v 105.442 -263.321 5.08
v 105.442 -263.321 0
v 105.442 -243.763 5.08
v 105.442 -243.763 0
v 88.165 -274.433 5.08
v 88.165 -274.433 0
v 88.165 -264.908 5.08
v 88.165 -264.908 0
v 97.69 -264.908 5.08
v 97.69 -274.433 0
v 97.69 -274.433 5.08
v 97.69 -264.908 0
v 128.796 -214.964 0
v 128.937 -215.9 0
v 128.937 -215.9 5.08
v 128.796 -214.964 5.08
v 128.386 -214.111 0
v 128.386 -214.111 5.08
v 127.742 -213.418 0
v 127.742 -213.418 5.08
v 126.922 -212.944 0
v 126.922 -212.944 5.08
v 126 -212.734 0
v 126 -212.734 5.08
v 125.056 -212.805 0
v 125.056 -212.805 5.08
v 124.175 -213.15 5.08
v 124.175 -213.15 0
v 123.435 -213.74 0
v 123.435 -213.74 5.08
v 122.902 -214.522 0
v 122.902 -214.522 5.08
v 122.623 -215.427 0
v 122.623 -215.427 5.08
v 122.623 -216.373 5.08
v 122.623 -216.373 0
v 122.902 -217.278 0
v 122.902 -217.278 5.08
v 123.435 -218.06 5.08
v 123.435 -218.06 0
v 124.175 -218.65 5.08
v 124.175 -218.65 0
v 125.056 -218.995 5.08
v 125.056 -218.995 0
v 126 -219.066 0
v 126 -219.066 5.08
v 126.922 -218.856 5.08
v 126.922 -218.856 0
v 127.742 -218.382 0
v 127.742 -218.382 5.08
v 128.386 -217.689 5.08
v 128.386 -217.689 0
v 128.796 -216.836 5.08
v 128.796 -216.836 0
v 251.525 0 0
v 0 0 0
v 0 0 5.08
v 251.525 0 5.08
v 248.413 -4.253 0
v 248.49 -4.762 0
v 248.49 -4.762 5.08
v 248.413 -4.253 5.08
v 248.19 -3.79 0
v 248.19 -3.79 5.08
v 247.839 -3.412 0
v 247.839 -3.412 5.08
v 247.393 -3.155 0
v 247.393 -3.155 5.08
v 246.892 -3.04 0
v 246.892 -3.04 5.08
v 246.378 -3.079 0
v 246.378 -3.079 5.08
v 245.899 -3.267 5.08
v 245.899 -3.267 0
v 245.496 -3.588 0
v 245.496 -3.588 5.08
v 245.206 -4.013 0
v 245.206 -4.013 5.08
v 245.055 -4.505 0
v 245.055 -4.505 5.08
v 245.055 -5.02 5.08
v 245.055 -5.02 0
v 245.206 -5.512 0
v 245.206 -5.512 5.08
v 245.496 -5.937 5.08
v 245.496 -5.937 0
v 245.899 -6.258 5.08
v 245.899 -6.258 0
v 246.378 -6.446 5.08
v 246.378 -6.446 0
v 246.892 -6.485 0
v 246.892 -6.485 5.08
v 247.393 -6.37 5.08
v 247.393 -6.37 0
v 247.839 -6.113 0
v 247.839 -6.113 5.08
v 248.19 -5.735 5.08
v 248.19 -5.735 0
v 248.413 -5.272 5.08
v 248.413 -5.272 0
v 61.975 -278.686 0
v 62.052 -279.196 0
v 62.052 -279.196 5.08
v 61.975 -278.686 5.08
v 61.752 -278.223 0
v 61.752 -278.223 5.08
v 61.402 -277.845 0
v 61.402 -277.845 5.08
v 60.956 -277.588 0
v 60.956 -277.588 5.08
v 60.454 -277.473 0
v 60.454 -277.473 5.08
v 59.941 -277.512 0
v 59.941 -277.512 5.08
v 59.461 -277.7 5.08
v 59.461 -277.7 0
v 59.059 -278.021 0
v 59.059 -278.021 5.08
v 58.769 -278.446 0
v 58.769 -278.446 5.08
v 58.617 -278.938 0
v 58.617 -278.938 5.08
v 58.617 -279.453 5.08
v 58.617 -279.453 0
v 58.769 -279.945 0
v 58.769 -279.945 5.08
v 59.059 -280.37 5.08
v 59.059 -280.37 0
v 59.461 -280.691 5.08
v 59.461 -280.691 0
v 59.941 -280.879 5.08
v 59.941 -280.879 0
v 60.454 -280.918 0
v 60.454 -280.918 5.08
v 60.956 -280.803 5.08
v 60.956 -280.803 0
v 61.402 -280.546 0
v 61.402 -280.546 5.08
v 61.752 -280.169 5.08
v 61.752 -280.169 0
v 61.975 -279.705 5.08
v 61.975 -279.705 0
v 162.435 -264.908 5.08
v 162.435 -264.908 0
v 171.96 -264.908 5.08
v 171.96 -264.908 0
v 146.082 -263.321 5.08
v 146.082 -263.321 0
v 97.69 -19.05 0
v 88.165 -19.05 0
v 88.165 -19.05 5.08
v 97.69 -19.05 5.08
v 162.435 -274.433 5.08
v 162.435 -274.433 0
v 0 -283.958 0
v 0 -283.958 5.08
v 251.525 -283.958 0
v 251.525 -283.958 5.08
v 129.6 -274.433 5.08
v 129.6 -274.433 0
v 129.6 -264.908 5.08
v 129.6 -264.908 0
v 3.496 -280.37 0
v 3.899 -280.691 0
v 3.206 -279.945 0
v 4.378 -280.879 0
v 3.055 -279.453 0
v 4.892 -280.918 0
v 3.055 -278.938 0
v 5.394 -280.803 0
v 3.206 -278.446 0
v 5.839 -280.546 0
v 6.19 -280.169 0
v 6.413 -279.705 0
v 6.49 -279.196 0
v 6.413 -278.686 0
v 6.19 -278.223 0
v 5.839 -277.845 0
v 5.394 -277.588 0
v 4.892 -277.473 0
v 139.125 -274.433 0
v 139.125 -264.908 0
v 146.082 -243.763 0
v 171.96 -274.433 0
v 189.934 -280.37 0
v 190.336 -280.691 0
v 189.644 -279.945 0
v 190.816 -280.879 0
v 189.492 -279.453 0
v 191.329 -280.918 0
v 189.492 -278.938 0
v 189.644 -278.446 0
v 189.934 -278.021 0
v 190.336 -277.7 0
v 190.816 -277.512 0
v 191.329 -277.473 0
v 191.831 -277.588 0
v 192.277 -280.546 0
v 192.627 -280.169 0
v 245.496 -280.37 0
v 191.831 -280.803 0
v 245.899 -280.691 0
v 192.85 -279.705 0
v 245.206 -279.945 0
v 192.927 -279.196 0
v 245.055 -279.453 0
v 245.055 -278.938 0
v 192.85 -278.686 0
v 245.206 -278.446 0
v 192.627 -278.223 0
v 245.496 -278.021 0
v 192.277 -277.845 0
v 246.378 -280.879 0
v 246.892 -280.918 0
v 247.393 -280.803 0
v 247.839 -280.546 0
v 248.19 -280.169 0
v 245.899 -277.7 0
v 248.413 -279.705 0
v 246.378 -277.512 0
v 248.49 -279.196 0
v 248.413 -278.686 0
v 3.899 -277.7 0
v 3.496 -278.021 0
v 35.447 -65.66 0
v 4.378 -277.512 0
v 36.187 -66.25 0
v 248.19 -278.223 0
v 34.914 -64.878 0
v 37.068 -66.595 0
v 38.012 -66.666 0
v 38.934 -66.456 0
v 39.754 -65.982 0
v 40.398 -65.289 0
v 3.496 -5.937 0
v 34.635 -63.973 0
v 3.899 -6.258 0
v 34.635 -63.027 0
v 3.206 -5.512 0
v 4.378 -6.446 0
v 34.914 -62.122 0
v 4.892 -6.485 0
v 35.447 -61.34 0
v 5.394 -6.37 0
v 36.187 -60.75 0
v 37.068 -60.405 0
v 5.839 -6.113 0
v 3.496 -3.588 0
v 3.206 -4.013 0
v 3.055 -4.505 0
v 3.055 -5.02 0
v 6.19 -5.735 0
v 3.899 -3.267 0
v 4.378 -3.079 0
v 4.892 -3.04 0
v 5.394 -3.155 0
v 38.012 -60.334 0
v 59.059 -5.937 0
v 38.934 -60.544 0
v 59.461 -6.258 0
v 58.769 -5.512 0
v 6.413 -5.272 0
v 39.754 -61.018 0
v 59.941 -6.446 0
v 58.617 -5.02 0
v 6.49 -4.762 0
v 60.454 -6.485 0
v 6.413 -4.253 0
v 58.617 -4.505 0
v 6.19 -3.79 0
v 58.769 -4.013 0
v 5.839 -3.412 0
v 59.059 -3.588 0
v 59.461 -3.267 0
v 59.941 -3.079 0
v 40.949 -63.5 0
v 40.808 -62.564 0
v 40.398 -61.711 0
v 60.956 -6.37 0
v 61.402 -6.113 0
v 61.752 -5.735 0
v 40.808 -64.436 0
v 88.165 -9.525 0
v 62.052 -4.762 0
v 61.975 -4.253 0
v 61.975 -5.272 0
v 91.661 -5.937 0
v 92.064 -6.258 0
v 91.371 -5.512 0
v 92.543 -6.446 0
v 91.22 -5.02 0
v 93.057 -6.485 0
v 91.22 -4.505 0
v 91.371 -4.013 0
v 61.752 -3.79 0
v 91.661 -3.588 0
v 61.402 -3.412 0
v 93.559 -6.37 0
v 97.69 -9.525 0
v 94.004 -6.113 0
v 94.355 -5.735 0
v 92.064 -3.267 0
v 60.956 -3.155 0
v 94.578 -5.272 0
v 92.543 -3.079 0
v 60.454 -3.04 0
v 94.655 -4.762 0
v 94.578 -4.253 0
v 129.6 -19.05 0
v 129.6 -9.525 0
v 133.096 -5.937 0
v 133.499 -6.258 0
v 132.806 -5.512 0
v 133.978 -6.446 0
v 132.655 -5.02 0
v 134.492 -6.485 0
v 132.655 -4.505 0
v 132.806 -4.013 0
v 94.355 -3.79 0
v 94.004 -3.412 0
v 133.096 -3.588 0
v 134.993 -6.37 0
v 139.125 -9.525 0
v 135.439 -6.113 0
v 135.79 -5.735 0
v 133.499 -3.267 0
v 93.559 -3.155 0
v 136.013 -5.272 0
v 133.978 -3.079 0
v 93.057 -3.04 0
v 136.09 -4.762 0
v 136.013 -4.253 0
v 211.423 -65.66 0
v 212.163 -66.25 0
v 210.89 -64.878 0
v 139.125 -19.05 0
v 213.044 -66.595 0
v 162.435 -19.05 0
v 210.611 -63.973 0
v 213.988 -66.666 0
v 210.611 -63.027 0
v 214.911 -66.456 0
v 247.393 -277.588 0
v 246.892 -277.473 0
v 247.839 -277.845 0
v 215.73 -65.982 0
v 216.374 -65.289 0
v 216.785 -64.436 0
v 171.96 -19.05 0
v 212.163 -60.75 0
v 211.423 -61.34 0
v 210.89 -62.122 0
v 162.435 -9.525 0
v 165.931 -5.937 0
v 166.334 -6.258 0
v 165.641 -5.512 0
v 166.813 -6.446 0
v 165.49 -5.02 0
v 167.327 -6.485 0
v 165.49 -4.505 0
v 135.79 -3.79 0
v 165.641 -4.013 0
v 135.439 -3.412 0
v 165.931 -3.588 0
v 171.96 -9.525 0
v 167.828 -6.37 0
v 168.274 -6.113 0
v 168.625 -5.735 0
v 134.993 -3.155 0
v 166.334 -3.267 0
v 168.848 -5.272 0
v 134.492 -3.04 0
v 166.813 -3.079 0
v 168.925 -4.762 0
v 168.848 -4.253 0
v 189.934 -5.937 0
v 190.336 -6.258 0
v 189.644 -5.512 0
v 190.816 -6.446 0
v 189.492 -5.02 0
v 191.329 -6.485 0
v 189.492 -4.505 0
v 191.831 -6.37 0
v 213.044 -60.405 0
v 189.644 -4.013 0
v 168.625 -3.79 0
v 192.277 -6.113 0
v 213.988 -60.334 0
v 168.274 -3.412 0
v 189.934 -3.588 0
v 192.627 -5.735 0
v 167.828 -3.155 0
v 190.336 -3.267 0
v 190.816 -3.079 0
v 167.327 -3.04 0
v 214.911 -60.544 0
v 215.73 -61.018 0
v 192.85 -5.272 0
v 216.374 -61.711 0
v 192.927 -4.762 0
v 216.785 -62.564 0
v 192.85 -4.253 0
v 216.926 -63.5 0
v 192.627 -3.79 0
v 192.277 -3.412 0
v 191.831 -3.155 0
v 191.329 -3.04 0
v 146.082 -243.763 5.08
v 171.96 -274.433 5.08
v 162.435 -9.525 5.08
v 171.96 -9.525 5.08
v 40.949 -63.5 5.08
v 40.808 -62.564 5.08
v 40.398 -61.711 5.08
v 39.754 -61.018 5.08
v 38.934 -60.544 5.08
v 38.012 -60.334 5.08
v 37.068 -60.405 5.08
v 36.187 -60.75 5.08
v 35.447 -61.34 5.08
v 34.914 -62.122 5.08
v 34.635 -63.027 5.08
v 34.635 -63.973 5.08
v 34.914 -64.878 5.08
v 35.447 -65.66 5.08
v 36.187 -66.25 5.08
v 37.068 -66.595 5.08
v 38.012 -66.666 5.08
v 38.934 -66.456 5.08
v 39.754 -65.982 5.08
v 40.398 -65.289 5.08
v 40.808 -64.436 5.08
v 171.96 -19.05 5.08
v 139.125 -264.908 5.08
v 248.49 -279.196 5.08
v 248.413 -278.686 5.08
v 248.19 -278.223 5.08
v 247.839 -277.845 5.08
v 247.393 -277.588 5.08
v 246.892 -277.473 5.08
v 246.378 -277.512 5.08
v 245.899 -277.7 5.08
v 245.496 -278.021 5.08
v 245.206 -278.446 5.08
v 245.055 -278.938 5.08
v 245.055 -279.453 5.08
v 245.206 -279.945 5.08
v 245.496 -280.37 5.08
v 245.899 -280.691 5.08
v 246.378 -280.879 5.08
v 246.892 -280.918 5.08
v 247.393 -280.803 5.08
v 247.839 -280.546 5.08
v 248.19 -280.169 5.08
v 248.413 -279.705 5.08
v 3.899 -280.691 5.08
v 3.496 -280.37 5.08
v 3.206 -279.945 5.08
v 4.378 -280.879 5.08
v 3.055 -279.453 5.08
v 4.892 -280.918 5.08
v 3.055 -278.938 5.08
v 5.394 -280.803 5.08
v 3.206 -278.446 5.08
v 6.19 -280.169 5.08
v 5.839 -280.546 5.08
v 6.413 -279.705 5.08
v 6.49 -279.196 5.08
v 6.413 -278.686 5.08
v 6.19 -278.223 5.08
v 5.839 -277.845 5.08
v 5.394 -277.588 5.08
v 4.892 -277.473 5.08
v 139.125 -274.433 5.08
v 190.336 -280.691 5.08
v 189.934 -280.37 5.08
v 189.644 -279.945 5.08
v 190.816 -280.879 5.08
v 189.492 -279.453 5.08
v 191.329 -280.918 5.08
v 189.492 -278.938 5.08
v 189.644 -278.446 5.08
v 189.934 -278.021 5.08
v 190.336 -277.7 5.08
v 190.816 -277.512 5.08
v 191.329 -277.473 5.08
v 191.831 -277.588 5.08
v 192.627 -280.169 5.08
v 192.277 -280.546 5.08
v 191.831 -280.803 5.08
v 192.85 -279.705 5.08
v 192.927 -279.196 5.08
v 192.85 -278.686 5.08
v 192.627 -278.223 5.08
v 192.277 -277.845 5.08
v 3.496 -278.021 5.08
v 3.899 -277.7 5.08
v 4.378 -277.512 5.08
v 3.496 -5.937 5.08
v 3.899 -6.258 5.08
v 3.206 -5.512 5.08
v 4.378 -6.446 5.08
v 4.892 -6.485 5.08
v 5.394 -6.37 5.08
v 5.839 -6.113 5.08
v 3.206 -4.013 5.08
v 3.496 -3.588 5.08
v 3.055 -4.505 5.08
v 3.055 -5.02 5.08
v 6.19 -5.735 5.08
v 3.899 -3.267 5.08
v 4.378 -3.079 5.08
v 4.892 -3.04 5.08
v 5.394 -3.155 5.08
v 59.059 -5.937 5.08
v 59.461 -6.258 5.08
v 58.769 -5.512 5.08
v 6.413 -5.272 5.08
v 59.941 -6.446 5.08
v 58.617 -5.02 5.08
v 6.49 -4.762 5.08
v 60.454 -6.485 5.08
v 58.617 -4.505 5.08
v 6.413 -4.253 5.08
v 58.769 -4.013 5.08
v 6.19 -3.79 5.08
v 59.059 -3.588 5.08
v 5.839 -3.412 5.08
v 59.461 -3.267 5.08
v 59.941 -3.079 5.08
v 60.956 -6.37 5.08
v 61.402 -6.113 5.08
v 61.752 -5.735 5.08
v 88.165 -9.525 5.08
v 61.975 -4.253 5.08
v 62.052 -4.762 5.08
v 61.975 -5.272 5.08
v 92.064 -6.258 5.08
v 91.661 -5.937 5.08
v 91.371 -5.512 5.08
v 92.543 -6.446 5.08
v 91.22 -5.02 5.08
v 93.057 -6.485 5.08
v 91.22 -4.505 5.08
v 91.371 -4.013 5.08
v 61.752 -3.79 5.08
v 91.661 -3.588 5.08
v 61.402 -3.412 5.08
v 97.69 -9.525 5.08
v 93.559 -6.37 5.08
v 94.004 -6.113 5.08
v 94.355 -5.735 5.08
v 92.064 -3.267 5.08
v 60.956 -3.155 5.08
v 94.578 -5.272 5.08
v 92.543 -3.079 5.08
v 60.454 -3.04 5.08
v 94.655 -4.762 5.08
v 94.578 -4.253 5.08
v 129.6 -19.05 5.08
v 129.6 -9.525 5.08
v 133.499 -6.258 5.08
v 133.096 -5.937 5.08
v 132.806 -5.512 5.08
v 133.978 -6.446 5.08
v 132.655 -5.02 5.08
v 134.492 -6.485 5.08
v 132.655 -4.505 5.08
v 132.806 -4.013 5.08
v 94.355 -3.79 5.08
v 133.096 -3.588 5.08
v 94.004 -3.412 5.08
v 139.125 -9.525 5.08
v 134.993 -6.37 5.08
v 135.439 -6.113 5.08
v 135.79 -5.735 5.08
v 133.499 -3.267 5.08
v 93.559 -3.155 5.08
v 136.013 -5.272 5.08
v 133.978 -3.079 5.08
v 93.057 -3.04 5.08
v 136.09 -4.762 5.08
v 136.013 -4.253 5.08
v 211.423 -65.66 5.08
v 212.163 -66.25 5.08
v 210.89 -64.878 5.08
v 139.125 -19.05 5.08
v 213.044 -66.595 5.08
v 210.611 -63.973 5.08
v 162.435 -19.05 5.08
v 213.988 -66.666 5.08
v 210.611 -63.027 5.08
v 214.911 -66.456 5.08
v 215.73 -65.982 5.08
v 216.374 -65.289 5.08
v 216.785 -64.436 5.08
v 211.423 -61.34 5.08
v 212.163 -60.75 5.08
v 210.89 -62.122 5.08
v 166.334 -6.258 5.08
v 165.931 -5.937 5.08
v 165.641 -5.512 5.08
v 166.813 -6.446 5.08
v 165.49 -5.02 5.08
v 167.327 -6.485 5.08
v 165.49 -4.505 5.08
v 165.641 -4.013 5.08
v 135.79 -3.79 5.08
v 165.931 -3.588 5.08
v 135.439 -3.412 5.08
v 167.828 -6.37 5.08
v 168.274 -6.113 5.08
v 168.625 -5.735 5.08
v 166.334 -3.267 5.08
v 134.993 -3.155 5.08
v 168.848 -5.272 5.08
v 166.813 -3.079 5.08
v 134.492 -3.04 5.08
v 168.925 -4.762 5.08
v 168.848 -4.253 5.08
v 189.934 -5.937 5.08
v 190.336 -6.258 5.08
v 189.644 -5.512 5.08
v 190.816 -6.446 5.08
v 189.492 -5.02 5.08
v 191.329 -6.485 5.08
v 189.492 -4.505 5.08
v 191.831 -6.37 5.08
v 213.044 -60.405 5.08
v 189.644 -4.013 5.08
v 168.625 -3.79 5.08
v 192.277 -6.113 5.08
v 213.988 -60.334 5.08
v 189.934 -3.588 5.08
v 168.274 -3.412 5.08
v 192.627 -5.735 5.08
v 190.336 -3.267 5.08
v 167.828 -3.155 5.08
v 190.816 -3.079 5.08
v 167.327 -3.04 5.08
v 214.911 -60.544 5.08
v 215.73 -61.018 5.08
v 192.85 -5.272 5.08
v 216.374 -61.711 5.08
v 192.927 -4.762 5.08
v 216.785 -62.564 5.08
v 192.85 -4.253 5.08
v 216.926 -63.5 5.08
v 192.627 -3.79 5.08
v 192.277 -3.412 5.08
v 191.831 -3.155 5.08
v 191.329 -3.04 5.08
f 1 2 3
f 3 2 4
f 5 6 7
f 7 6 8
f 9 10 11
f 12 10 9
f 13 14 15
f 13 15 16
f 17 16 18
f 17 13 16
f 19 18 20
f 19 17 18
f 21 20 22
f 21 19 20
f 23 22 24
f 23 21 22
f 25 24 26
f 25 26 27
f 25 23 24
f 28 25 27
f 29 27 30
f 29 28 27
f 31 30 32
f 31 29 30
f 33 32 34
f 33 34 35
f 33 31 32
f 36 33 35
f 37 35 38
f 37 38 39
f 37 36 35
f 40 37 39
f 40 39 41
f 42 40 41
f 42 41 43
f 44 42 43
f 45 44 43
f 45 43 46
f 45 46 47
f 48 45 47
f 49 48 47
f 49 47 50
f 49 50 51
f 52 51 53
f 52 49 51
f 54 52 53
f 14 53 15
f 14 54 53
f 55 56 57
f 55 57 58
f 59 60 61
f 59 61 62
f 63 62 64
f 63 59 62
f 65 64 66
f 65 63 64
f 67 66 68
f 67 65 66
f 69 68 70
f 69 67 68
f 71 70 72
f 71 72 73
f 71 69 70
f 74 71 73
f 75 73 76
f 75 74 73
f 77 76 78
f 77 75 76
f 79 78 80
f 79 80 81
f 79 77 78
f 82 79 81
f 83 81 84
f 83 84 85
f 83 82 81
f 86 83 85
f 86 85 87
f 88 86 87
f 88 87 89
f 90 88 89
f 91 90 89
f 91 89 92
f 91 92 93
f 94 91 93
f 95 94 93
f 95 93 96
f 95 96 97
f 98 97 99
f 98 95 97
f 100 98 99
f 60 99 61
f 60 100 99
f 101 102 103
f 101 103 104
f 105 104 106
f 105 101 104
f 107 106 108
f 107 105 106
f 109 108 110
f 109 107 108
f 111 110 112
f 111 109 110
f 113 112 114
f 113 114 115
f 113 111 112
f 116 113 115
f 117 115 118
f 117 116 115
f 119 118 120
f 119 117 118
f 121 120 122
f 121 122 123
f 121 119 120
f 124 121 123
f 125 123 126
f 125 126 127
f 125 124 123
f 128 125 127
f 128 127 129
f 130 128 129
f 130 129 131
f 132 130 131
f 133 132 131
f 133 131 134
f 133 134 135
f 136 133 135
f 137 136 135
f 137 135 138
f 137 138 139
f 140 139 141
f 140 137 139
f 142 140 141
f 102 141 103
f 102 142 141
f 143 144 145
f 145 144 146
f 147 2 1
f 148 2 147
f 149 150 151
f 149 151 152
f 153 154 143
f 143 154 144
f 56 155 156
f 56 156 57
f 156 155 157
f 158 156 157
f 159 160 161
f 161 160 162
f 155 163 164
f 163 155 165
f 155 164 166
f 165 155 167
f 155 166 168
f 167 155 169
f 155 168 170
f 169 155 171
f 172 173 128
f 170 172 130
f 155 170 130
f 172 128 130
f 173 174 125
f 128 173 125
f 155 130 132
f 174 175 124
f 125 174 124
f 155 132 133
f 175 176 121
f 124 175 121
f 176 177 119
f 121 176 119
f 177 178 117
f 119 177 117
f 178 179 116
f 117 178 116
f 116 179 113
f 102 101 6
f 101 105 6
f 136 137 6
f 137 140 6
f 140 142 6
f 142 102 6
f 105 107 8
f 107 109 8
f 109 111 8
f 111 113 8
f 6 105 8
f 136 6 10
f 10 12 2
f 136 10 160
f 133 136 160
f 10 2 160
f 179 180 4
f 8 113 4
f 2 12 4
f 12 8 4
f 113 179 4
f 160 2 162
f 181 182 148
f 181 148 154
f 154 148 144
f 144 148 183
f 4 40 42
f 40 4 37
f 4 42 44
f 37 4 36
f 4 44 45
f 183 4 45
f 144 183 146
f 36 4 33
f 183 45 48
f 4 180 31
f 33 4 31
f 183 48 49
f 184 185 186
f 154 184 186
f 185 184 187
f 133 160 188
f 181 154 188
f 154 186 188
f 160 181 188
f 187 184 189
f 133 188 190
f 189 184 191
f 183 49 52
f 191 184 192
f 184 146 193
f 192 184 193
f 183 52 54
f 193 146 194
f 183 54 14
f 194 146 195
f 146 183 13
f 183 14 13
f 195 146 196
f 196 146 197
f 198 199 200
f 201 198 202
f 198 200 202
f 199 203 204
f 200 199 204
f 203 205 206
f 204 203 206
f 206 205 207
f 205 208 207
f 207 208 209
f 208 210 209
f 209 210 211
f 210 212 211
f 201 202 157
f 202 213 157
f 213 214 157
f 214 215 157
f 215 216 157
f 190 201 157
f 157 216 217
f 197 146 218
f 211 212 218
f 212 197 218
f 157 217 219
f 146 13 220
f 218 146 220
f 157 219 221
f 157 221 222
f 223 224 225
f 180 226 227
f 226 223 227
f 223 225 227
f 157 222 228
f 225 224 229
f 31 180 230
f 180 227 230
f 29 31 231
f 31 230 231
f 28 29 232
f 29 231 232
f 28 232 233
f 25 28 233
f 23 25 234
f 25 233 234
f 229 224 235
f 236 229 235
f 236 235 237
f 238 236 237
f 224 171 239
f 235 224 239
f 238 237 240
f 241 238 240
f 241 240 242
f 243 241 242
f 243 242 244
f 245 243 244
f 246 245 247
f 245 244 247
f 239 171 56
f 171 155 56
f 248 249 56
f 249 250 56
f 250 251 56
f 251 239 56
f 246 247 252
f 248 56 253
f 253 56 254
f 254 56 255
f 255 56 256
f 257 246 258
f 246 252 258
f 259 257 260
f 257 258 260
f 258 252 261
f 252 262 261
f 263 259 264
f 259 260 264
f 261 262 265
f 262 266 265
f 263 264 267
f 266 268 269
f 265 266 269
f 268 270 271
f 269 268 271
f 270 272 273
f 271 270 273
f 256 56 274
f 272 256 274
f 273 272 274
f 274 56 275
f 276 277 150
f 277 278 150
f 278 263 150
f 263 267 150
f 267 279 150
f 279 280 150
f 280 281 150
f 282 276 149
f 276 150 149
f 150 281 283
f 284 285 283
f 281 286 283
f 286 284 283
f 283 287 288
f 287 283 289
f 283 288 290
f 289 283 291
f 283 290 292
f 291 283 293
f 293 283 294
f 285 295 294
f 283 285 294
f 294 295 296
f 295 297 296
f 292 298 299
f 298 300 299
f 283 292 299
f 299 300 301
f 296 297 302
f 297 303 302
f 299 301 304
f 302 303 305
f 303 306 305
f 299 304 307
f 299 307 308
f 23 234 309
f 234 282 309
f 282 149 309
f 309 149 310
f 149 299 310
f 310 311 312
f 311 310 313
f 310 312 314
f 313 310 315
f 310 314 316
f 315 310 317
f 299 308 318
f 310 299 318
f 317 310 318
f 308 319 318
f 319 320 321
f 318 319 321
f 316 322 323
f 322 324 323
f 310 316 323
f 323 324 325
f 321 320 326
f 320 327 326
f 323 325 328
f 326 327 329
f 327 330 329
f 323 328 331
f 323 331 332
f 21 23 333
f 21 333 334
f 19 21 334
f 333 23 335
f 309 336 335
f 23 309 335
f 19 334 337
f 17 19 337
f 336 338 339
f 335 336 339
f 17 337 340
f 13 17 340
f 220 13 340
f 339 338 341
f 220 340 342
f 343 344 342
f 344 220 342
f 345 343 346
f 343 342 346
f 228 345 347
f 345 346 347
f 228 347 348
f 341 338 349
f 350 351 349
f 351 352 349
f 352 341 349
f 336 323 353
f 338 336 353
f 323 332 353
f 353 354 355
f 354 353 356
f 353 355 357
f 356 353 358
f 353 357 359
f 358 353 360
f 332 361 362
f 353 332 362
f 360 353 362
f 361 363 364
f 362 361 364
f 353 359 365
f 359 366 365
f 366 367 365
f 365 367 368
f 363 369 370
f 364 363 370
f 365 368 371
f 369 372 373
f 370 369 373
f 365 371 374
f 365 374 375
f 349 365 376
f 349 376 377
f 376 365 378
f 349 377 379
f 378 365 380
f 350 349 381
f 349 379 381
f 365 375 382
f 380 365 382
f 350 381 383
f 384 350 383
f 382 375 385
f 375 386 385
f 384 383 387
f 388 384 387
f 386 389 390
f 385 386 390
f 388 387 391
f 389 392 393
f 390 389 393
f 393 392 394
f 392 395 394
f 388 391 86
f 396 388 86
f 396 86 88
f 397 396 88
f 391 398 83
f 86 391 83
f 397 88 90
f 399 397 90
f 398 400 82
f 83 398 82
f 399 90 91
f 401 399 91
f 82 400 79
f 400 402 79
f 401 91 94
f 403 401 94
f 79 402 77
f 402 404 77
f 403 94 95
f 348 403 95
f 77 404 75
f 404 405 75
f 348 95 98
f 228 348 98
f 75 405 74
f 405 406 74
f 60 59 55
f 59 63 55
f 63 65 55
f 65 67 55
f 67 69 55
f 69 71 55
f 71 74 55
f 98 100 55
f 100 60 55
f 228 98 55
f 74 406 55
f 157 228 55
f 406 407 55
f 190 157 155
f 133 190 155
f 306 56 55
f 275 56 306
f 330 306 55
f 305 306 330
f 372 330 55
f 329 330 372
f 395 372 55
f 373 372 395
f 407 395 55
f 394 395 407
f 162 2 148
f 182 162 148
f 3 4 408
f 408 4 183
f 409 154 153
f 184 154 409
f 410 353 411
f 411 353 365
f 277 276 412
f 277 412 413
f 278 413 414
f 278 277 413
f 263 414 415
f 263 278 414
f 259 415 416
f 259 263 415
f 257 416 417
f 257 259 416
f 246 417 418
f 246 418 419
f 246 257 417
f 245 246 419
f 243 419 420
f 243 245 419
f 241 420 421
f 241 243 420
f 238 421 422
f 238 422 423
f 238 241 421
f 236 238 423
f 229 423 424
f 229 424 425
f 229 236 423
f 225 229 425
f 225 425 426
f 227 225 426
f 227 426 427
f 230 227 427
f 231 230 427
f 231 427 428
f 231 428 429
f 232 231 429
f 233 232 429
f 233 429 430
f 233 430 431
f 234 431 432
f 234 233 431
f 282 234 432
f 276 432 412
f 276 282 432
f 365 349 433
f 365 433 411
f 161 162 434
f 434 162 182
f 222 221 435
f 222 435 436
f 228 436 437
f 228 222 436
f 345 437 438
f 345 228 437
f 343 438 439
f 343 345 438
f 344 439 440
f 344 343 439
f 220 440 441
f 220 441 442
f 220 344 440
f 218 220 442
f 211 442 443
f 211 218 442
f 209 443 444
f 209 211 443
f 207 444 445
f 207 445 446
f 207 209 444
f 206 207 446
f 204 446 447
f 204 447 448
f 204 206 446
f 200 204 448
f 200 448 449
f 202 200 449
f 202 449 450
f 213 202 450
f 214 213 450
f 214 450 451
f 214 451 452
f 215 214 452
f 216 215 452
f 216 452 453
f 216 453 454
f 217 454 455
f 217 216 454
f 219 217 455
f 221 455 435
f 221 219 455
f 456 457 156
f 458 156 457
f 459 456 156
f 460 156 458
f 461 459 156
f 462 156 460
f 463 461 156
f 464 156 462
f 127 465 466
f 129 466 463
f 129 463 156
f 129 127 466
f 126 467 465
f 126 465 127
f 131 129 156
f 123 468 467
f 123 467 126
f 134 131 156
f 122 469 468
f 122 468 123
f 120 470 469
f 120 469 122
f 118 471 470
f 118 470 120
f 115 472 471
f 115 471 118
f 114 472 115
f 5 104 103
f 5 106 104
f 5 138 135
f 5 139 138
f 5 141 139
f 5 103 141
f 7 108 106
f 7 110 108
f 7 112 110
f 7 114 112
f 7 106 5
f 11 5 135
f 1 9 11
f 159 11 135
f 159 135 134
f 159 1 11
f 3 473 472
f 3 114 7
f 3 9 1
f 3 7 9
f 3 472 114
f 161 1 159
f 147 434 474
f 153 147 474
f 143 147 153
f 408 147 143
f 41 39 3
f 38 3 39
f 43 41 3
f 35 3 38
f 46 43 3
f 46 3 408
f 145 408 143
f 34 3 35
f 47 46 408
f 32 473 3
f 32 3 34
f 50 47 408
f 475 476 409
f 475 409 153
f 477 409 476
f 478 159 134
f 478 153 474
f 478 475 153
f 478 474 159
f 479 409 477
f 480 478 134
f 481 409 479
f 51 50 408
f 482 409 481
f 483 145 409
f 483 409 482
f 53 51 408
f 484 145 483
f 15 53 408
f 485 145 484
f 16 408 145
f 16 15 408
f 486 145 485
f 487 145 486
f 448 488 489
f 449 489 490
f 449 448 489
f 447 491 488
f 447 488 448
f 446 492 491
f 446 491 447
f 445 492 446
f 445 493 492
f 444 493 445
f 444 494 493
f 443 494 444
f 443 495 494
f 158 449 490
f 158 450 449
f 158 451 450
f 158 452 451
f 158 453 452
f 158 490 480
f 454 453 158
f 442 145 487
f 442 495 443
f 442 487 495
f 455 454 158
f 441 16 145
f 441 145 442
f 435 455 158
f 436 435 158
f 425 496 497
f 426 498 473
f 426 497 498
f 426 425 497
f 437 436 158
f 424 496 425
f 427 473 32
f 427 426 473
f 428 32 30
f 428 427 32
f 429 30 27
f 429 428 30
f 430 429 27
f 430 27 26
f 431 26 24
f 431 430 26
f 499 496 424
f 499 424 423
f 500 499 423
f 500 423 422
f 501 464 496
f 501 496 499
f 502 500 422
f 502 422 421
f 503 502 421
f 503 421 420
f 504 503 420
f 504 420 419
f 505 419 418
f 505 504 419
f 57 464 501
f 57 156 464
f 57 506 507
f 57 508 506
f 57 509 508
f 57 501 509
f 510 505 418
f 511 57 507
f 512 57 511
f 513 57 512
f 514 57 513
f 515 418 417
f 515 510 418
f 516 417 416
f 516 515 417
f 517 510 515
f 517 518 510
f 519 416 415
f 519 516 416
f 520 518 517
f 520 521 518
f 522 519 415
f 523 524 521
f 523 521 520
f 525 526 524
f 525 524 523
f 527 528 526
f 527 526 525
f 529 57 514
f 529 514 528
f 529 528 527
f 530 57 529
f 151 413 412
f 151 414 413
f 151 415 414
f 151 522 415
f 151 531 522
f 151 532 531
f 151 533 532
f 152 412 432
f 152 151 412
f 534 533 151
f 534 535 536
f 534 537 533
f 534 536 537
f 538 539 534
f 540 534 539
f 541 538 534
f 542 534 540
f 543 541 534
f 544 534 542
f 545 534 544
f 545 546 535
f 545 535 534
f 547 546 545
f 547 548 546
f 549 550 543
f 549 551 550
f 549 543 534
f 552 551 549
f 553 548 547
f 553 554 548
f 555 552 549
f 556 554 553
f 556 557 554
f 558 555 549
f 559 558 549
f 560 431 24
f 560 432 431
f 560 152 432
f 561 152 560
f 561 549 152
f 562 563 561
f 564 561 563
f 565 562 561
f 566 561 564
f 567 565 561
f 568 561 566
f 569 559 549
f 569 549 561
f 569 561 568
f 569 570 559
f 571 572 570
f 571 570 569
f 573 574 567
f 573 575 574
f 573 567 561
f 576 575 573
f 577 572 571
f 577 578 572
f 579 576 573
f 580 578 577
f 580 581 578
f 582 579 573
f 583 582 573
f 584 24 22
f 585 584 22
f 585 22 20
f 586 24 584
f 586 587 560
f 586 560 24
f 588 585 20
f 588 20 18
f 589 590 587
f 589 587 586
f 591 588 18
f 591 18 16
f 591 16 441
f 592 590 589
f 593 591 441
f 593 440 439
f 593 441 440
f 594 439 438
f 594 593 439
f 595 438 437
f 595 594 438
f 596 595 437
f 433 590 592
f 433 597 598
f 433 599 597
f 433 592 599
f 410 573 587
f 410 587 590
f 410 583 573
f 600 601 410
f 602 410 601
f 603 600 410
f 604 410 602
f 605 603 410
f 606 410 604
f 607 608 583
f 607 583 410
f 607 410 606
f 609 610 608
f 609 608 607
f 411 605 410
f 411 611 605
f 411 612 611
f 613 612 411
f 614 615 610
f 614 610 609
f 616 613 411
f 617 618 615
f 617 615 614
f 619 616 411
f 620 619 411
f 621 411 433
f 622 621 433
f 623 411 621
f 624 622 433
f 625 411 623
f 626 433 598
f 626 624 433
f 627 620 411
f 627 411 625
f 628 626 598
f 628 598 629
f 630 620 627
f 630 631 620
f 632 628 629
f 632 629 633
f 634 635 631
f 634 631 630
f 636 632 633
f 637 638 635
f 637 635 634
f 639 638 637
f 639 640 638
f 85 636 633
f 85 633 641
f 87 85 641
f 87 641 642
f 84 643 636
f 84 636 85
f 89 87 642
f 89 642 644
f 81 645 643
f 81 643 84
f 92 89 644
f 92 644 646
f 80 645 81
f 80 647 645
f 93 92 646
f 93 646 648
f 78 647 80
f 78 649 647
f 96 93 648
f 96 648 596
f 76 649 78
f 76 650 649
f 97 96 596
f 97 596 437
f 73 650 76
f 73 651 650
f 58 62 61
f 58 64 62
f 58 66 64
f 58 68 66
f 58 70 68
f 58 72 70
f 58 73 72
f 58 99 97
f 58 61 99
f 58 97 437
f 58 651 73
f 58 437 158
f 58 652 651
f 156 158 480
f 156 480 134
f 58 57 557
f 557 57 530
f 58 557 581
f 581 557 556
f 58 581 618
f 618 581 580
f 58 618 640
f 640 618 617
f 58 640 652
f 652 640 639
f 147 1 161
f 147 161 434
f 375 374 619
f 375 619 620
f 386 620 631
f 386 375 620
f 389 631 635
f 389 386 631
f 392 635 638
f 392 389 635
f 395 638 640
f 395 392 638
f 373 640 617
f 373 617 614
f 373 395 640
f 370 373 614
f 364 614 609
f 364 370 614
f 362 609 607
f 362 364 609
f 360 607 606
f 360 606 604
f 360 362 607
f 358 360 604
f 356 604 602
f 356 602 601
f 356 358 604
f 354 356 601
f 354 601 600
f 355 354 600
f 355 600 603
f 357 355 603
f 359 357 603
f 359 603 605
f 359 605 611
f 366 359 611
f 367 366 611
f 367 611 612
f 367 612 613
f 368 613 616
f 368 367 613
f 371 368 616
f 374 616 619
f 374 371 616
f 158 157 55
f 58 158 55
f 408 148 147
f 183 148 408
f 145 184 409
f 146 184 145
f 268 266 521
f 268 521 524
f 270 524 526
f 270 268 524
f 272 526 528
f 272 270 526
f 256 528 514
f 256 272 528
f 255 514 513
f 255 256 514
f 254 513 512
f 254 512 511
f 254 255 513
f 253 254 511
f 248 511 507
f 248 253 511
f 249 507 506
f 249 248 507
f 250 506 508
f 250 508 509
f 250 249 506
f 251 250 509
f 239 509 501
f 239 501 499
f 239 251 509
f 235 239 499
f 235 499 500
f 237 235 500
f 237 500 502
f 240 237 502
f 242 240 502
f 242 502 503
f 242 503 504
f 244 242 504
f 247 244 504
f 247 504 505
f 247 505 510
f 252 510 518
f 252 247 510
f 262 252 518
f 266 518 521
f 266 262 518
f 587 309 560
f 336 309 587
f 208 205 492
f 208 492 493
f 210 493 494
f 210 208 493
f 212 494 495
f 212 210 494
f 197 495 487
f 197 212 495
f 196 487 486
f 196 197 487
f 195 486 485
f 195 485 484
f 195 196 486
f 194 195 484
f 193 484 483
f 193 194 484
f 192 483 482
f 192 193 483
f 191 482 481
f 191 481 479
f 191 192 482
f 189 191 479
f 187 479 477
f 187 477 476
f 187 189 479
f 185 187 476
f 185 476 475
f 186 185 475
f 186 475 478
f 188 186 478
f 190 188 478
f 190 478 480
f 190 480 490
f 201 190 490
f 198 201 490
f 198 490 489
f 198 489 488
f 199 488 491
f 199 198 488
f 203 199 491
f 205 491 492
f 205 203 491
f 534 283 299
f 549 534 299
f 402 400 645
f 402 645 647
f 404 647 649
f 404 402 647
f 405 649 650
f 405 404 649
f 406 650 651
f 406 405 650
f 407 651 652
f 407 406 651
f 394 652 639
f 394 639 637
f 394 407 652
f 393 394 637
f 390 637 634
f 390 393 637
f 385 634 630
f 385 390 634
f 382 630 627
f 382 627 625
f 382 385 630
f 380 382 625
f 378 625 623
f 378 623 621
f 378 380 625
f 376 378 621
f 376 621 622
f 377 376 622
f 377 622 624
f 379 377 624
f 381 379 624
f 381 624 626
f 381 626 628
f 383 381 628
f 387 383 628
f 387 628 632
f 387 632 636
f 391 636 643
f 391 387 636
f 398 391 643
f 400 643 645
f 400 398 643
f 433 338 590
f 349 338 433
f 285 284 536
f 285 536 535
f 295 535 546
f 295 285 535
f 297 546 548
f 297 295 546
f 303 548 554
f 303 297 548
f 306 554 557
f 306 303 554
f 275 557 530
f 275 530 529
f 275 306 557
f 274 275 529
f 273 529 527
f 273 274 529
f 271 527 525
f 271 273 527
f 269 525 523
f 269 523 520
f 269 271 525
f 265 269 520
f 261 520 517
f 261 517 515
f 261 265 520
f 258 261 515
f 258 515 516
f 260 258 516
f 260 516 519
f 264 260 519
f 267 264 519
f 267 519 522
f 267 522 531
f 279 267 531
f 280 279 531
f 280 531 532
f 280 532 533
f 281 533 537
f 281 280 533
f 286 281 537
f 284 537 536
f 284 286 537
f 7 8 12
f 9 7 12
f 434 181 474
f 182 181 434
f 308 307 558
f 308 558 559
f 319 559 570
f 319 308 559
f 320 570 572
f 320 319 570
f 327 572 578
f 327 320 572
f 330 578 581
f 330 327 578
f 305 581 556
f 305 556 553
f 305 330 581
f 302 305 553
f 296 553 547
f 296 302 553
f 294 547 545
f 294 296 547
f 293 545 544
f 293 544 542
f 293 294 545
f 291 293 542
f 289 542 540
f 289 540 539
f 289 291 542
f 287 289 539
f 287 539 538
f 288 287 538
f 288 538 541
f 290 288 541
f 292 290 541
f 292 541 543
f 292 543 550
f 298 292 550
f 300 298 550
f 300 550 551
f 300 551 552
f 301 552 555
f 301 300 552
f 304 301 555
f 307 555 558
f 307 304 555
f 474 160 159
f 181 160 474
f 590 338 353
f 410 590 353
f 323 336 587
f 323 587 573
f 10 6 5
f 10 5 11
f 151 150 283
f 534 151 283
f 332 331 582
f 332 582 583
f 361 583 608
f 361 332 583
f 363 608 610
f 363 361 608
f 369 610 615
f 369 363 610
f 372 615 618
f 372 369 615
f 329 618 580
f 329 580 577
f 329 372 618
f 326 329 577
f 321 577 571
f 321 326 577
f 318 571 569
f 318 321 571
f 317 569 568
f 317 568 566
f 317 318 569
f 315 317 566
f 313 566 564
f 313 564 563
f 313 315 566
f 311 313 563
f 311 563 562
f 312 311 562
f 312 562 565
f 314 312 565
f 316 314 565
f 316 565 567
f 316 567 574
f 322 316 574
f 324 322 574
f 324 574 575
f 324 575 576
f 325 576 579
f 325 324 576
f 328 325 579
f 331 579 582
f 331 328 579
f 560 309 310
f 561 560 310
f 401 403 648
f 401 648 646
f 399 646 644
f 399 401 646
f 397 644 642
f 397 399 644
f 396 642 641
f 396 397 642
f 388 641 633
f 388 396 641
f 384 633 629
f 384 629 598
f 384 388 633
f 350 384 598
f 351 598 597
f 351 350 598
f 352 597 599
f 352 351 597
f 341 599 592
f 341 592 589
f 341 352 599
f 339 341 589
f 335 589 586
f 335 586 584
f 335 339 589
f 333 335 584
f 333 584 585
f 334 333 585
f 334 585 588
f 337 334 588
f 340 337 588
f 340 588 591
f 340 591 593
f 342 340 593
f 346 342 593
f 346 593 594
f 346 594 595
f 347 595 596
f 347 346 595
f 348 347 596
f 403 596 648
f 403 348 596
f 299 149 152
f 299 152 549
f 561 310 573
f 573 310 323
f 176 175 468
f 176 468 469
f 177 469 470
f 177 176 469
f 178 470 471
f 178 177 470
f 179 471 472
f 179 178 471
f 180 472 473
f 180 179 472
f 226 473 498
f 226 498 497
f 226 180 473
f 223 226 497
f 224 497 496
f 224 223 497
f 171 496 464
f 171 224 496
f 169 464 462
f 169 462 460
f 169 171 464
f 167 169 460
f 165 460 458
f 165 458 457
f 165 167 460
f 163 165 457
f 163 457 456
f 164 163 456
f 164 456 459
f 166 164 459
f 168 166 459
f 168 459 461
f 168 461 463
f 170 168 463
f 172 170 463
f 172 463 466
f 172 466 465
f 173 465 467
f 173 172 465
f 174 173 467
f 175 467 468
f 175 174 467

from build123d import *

# Parameters (mm, degrees)
F0_W     = 251.524948
F0_H     = 283.958055
F0_R     = 1.7272
F0_W_2   = 9.525
F0_H_2   = 9.525
F0_R_2   = 3.175
F0_W_3   = 40.64
F0_H_3   = 19.558
F1_DEPTH = 5.08


with BuildPart() as f1:
    # F0 (on Top) → F1 (new body)
    with BuildSketch(Plane.XY):
        with Locations((125.762474, -141.979028)):
            Rectangle(F0_W, F0_H)
        with Locations((4.7625, -279.195555)):
            Circle(F0_R, mode=Mode.SUBTRACT)
        with Locations((60.325, -279.195555)):
            Circle(F0_R, mode=Mode.SUBTRACT)
        with Locations((92.9275, -269.670555)):
            Rectangle(F0_W_2, F0_H_2, mode=Mode.SUBTRACT)
        with Locations((125.762474, -215.9)):
            Circle(F0_R_2, mode=Mode.SUBTRACT)
        with Locations((134.362469, -269.670555)):
            Rectangle(F0_W_2, F0_H_2, mode=Mode.SUBTRACT)
        with Locations((125.762474, -253.541555)):
            Rectangle(F0_W_3, F0_H_3, mode=Mode.SUBTRACT)
        with Locations((167.197443, -269.670555)):
            Rectangle(F0_W_2, F0_H_2, mode=Mode.SUBTRACT)
        with Locations((191.199948, -279.195555)):
            Circle(F0_R, mode=Mode.SUBTRACT)
        with Locations((246.762448, -279.195555)):
            Circle(F0_R, mode=Mode.SUBTRACT)
        with Locations((37.774293, -63.5)):
            Circle(F0_R_2, mode=Mode.SUBTRACT)
        with Locations((4.7625, -4.7625)):
            Circle(F0_R, mode=Mode.SUBTRACT)
        with Locations((60.325, -4.7625)):
            Circle(F0_R, mode=Mode.SUBTRACT)
        with Locations((92.9275, -14.2875)):
            Rectangle(F0_W_2, F0_H_2, mode=Mode.SUBTRACT)
        with Locations((92.9275, -4.7625)):
            Circle(F0_R, mode=Mode.SUBTRACT)
        with Locations((134.362469, -14.2875)):
            Rectangle(F0_W_2, F0_H_2, mode=Mode.SUBTRACT)
        with Locations((134.362469, -4.7625)):
            Circle(F0_R, mode=Mode.SUBTRACT)
        with Locations((167.197443, -14.2875)):
            Rectangle(F0_W_2, F0_H_2, mode=Mode.SUBTRACT)
        with Locations((167.197443, -4.7625)):
            Circle(F0_R, mode=Mode.SUBTRACT)
        with Locations((213.750655, -63.5)):
            Circle(F0_R_2, mode=Mode.SUBTRACT)
        with Locations((191.199948, -4.7625)):
            Circle(F0_R, mode=Mode.SUBTRACT)
        with Locations((246.762448, -4.7625)):
            Circle(F0_R, mode=Mode.SUBTRACT)
    extrude(amount=F1_DEPTH)


solid = f1.part
